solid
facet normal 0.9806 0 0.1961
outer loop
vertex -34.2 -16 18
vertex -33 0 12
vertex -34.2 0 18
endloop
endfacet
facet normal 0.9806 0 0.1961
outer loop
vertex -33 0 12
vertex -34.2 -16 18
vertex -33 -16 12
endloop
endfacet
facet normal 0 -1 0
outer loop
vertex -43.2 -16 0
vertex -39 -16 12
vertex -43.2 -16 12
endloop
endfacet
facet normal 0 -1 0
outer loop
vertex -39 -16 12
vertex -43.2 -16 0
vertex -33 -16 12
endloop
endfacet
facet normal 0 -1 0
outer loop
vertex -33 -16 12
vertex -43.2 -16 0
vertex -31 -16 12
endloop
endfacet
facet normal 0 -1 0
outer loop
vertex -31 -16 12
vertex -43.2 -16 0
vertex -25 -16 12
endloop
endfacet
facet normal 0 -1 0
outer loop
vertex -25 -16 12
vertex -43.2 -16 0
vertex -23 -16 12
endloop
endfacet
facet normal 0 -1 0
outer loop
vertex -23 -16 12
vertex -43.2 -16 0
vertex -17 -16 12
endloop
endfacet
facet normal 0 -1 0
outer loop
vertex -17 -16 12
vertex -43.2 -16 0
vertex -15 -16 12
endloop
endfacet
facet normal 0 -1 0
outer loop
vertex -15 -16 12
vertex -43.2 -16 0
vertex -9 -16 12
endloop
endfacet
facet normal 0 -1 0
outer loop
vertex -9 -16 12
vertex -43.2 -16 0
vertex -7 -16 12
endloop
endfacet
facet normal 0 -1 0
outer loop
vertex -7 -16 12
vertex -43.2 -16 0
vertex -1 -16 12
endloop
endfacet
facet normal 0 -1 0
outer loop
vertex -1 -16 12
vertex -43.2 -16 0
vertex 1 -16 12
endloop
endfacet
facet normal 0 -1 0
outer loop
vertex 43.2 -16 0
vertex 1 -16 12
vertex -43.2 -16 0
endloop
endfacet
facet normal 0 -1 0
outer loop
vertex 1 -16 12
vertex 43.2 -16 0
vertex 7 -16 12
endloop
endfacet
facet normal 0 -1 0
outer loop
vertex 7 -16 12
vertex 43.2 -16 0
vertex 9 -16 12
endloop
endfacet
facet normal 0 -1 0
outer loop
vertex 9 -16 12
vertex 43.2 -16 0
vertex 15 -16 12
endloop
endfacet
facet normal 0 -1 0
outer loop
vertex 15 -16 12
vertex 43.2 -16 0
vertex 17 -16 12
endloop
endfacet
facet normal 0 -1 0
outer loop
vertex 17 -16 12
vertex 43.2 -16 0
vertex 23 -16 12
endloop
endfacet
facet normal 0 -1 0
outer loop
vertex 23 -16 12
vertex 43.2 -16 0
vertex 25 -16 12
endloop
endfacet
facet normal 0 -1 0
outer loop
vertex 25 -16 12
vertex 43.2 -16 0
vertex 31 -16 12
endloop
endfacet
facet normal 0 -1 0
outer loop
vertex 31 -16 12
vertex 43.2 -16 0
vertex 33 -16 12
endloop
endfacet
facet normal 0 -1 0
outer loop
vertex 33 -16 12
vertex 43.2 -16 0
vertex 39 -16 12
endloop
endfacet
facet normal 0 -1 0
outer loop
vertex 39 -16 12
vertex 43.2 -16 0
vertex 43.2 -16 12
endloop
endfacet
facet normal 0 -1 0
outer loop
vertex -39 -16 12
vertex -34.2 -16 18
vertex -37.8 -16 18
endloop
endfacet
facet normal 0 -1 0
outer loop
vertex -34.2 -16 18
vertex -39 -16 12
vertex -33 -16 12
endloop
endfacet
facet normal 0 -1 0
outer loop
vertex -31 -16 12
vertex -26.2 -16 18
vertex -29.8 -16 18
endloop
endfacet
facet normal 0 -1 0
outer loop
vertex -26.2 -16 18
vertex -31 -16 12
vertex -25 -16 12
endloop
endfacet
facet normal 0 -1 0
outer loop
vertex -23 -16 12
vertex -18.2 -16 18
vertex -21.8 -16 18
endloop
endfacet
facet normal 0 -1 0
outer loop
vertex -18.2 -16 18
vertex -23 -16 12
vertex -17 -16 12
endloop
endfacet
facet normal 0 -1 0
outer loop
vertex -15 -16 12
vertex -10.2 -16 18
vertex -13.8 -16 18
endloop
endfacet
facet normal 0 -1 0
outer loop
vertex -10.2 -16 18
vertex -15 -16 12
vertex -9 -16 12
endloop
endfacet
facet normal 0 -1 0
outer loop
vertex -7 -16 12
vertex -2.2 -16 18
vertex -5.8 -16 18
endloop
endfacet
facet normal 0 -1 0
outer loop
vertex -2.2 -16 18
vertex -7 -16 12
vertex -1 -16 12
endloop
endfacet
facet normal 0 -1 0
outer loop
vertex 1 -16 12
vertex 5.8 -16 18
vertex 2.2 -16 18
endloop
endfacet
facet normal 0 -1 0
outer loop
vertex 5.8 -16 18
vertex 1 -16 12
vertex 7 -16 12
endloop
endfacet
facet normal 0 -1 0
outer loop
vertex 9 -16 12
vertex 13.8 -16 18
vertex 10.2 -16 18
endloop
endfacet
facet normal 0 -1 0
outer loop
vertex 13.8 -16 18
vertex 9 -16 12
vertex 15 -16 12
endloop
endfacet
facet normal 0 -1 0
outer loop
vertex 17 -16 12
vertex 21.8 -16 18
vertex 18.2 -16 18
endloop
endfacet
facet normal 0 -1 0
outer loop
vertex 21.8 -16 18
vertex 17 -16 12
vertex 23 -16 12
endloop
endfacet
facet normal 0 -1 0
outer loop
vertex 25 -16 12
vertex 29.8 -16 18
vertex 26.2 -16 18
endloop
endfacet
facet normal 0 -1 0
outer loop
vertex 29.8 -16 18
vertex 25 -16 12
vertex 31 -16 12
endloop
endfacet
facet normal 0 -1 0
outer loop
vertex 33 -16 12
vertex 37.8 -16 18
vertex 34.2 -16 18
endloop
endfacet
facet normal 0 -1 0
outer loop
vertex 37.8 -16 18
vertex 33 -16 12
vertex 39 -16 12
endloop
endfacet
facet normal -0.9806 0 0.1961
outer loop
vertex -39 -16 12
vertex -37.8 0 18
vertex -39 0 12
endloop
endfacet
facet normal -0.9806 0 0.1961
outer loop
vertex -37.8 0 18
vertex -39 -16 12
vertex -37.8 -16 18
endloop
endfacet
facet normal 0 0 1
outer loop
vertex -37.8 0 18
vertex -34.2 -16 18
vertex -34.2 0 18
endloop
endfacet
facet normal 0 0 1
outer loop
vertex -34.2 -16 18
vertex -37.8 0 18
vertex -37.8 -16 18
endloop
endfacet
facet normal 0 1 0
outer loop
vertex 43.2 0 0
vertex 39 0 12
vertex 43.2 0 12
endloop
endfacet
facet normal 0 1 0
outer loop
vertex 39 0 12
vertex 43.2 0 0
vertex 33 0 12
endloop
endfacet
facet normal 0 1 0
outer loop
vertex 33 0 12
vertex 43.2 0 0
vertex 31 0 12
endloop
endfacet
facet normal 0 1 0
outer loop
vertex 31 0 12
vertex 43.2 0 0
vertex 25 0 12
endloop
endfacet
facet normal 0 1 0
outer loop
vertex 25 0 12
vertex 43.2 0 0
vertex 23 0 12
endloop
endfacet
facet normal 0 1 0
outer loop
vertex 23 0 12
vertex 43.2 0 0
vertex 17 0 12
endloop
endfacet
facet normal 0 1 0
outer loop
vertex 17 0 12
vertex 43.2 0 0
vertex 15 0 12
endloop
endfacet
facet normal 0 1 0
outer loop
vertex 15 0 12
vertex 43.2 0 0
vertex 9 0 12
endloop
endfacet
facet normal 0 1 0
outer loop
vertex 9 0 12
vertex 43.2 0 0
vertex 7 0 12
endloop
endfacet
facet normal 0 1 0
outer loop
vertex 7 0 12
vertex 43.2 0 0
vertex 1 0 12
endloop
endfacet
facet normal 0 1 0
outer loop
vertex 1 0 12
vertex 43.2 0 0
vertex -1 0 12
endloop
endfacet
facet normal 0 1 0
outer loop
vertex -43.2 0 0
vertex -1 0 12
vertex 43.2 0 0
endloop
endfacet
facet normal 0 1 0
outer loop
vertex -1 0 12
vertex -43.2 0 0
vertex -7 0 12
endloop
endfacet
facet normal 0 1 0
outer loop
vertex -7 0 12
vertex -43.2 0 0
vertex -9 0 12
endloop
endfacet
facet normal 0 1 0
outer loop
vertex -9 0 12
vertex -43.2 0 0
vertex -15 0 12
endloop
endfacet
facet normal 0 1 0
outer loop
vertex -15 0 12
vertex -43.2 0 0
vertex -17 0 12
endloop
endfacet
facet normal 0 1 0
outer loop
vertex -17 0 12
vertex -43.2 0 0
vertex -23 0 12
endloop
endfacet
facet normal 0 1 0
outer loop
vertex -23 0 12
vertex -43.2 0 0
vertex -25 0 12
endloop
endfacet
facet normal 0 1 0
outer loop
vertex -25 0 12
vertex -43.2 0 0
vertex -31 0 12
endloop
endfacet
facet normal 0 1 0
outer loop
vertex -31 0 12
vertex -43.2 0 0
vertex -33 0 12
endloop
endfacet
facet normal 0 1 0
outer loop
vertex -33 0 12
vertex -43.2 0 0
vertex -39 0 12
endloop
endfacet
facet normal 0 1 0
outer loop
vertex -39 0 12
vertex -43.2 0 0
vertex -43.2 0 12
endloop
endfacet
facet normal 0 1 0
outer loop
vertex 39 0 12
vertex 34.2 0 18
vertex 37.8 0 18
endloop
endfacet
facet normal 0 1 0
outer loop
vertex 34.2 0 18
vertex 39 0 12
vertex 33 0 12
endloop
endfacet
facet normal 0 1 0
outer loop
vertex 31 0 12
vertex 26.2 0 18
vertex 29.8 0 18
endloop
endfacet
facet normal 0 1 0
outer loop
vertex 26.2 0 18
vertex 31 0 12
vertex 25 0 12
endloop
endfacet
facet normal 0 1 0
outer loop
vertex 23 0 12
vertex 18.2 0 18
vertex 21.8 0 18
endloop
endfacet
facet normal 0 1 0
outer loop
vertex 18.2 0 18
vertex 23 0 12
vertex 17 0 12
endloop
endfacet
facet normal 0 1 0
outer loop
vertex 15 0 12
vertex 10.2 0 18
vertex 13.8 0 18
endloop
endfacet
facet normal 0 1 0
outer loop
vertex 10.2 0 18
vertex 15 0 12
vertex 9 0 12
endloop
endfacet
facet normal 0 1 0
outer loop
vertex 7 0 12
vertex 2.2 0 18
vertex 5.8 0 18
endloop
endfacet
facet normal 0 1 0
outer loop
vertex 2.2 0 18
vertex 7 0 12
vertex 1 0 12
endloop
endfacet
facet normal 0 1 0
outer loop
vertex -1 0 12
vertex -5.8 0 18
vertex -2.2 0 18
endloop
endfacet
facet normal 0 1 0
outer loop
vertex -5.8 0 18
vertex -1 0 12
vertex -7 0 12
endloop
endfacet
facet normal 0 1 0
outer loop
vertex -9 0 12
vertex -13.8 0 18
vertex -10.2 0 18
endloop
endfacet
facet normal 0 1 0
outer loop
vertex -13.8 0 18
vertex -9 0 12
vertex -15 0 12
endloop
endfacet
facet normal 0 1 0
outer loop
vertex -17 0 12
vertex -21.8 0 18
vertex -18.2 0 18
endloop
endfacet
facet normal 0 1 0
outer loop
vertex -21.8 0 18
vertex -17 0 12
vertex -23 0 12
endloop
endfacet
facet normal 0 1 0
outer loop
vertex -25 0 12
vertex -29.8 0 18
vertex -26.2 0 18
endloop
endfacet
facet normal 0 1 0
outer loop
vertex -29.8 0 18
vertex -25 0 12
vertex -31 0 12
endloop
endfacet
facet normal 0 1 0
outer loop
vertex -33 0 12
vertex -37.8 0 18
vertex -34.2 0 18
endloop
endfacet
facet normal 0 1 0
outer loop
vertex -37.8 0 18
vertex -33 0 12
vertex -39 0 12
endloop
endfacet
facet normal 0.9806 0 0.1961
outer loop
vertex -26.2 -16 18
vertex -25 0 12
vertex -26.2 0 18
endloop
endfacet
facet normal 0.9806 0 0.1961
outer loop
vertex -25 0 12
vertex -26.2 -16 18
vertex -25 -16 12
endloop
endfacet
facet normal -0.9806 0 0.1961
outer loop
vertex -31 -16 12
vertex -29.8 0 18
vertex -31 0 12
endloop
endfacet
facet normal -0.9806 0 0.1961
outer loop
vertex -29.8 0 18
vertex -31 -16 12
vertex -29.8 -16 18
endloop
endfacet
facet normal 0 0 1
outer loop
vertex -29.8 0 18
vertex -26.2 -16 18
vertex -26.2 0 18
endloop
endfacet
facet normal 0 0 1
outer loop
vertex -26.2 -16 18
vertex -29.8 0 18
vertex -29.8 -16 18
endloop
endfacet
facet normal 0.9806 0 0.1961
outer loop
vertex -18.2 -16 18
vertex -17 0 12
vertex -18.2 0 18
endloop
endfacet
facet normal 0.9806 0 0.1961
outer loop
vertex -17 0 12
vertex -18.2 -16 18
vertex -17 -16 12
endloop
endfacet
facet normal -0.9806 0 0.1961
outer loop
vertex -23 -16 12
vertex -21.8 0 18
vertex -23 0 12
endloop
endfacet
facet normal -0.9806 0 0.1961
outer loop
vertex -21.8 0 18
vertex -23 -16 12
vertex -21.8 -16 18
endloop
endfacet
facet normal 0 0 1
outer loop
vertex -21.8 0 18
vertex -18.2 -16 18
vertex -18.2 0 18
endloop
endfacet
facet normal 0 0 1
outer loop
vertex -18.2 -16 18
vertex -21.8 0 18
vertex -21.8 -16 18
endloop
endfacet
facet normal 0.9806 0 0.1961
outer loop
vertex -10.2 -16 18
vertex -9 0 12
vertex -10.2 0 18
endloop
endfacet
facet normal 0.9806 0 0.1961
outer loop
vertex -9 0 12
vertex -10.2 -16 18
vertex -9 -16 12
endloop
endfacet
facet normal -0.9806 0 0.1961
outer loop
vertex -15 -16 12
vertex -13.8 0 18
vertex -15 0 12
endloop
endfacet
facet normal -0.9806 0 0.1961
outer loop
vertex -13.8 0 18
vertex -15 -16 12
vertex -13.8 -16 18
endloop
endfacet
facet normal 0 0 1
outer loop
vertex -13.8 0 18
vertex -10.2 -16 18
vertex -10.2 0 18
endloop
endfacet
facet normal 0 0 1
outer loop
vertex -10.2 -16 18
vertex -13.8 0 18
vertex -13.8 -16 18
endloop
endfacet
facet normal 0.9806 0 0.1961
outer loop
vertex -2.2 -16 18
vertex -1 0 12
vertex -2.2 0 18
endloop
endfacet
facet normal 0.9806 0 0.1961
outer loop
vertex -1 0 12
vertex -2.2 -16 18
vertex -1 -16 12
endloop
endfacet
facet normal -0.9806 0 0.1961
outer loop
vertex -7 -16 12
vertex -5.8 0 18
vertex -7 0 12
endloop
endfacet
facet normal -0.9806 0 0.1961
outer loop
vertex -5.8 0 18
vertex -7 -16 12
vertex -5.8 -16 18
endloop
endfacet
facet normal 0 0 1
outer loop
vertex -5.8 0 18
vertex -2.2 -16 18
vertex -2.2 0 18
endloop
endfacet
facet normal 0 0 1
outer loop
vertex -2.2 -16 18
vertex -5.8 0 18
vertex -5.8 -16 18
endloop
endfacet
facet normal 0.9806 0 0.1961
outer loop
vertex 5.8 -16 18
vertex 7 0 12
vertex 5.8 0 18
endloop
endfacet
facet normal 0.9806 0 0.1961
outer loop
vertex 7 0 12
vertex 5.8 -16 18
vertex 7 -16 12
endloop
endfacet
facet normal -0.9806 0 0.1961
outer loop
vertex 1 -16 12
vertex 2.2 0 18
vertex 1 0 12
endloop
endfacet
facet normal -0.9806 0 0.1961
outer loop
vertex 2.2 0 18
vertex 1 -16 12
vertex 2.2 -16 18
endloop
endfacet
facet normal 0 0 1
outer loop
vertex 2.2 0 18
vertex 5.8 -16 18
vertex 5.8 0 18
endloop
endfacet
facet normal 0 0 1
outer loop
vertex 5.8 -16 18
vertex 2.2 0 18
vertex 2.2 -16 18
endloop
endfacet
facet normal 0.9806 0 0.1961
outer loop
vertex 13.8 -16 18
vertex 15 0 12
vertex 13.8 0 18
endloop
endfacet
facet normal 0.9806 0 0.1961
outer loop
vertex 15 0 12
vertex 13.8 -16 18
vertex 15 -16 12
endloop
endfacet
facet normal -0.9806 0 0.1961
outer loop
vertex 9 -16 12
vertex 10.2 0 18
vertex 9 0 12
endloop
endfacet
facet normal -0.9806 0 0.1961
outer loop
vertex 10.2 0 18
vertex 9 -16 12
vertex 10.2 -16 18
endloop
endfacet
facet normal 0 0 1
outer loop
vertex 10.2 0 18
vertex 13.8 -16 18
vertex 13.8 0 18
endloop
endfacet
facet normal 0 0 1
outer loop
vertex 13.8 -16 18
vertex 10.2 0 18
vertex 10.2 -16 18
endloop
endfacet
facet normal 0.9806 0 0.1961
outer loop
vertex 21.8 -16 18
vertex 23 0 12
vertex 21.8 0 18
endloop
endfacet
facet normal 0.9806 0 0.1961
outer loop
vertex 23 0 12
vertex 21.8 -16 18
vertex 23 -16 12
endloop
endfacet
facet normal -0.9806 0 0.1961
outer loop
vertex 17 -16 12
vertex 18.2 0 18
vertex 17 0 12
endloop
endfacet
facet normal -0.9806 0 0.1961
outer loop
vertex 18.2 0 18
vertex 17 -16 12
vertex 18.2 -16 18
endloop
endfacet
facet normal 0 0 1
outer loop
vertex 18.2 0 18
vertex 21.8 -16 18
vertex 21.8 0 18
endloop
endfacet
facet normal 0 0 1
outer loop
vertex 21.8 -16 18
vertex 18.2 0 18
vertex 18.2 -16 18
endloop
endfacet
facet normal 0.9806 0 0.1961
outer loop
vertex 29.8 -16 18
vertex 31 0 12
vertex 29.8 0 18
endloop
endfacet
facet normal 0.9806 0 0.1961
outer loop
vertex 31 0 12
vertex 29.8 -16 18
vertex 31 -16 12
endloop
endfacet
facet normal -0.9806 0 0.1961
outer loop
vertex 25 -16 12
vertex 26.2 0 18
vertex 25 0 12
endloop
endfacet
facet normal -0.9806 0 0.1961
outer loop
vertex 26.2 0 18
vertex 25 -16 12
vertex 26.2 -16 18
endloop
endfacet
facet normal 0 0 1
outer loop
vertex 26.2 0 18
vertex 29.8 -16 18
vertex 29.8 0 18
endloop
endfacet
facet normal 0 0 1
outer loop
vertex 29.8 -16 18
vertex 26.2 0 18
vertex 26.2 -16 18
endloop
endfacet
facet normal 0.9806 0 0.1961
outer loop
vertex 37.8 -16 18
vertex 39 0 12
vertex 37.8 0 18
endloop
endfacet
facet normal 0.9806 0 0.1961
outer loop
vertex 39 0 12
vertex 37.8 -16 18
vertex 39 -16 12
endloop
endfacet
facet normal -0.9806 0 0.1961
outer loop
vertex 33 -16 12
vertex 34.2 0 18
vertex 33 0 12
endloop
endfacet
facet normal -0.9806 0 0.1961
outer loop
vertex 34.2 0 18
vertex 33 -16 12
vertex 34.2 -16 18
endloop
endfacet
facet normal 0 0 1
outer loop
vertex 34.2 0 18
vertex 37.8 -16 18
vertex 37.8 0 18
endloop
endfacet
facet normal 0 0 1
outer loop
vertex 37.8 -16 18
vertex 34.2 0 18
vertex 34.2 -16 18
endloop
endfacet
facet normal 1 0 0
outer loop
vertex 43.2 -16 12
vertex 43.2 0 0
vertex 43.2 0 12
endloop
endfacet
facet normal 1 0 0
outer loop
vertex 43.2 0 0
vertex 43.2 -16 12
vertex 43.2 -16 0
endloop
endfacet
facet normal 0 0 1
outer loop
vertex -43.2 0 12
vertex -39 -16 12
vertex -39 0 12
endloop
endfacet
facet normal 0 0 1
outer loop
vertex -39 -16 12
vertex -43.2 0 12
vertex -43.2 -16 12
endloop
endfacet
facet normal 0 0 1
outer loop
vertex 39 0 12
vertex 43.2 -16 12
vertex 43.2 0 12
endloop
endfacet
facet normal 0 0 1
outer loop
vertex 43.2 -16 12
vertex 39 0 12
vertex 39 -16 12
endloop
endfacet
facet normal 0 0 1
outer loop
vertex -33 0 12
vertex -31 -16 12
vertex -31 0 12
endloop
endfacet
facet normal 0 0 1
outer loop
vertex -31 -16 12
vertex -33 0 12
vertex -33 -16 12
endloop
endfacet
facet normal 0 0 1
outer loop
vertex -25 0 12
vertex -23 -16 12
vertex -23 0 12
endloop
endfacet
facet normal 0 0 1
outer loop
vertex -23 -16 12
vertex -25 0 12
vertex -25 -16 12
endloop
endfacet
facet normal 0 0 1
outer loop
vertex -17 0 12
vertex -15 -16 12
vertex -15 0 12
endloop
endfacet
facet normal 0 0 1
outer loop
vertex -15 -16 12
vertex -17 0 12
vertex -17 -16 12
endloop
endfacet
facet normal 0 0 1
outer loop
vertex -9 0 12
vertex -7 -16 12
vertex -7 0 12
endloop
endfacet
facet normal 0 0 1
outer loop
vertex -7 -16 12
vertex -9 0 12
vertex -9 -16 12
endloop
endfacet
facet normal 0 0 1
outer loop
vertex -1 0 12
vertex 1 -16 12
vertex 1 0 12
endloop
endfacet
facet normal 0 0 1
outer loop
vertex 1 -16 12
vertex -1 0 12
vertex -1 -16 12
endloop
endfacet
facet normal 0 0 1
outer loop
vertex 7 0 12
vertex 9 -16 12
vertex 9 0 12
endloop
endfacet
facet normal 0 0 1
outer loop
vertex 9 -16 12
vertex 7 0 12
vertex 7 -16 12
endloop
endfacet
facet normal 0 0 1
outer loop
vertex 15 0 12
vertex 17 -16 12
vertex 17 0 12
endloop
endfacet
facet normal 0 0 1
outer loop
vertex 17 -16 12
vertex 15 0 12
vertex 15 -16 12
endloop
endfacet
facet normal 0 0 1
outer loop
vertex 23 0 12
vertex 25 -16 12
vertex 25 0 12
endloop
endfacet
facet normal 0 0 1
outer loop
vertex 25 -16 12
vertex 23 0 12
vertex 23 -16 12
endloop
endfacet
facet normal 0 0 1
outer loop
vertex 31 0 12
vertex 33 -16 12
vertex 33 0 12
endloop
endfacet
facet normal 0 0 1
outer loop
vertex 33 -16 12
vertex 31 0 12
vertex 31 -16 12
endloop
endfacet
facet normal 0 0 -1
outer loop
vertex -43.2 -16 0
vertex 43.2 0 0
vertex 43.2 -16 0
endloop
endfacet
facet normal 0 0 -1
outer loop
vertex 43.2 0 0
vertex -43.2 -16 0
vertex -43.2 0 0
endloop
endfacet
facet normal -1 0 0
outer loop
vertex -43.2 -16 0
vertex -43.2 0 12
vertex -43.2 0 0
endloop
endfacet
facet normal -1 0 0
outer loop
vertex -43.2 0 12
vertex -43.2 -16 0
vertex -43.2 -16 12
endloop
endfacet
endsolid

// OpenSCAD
$fn = 32;

// ----------------------------------------------------------------------
// Toothed rack, 10 teeth
// 8 mm pitch, 6 mm teeth
// ----------------------------------------------------------------------

// --- parameters (mm) ---
bar_w = 16;     // bar width (Y)
bar_h = 12;     // bar height (Z)
teeth = 10;     // number of teeth
pitch = 8;      // tooth pitch
tooth_h = 6;    // tooth height above the bar
root_w = 6.4;   // tooth width at the root
crest_w = 3.6;  // tooth width at the crest

// --- derived feature positions (mm) ---
span = (teeth - 1) * pitch;  // = 72   distance between the outer teeth
bar_l = span + root_w + 8;   // = 86.4   bar length: teeth plus 4 mm at each end
tooth_x = -span / 2;         // = -36   X of the first tooth
height = bar_h + tooth_h;    // = 18   overall height
feature_centers = [
  [tooth_x + 0 * pitch, -bar_w / 2],
  [tooth_x + 1 * pitch, -bar_w / 2],
  [tooth_x + 2 * pitch, -bar_w / 2],
  [tooth_x + 3 * pitch, -bar_w / 2],
  [tooth_x + 4 * pitch, -bar_w / 2],
  [tooth_x + 5 * pitch, -bar_w / 2],
  [tooth_x + 6 * pitch, -bar_w / 2],
  [tooth_x + 7 * pitch, -bar_w / 2],
  [tooth_x + 8 * pitch, -bar_w / 2],
  [tooth_x + 9 * pitch, -bar_w / 2]
];   // tooth centre line, drives the tooth loop

// bar with a rack of teeth, one extruded trapezoium per centre
module rack_tooth() {
  linear_extrude(height = bar_w)
    polygon(points = [
      [0, 0],
      [root_w, 0],
      [root_w / 2 + crest_w / 2, tooth_h + 1],
      [root_w / 2 - crest_w / 2, tooth_h + 1]
    ]);
}

union() {
  translate([-bar_l / 2, -bar_w, 0]) cube([bar_l, bar_w, bar_h]);
  for (centre = feature_centers)
    translate([centre[0] - root_w / 2, 0, bar_h - 1]) rotate([90, 0, 0]) rack_tooth();
}
